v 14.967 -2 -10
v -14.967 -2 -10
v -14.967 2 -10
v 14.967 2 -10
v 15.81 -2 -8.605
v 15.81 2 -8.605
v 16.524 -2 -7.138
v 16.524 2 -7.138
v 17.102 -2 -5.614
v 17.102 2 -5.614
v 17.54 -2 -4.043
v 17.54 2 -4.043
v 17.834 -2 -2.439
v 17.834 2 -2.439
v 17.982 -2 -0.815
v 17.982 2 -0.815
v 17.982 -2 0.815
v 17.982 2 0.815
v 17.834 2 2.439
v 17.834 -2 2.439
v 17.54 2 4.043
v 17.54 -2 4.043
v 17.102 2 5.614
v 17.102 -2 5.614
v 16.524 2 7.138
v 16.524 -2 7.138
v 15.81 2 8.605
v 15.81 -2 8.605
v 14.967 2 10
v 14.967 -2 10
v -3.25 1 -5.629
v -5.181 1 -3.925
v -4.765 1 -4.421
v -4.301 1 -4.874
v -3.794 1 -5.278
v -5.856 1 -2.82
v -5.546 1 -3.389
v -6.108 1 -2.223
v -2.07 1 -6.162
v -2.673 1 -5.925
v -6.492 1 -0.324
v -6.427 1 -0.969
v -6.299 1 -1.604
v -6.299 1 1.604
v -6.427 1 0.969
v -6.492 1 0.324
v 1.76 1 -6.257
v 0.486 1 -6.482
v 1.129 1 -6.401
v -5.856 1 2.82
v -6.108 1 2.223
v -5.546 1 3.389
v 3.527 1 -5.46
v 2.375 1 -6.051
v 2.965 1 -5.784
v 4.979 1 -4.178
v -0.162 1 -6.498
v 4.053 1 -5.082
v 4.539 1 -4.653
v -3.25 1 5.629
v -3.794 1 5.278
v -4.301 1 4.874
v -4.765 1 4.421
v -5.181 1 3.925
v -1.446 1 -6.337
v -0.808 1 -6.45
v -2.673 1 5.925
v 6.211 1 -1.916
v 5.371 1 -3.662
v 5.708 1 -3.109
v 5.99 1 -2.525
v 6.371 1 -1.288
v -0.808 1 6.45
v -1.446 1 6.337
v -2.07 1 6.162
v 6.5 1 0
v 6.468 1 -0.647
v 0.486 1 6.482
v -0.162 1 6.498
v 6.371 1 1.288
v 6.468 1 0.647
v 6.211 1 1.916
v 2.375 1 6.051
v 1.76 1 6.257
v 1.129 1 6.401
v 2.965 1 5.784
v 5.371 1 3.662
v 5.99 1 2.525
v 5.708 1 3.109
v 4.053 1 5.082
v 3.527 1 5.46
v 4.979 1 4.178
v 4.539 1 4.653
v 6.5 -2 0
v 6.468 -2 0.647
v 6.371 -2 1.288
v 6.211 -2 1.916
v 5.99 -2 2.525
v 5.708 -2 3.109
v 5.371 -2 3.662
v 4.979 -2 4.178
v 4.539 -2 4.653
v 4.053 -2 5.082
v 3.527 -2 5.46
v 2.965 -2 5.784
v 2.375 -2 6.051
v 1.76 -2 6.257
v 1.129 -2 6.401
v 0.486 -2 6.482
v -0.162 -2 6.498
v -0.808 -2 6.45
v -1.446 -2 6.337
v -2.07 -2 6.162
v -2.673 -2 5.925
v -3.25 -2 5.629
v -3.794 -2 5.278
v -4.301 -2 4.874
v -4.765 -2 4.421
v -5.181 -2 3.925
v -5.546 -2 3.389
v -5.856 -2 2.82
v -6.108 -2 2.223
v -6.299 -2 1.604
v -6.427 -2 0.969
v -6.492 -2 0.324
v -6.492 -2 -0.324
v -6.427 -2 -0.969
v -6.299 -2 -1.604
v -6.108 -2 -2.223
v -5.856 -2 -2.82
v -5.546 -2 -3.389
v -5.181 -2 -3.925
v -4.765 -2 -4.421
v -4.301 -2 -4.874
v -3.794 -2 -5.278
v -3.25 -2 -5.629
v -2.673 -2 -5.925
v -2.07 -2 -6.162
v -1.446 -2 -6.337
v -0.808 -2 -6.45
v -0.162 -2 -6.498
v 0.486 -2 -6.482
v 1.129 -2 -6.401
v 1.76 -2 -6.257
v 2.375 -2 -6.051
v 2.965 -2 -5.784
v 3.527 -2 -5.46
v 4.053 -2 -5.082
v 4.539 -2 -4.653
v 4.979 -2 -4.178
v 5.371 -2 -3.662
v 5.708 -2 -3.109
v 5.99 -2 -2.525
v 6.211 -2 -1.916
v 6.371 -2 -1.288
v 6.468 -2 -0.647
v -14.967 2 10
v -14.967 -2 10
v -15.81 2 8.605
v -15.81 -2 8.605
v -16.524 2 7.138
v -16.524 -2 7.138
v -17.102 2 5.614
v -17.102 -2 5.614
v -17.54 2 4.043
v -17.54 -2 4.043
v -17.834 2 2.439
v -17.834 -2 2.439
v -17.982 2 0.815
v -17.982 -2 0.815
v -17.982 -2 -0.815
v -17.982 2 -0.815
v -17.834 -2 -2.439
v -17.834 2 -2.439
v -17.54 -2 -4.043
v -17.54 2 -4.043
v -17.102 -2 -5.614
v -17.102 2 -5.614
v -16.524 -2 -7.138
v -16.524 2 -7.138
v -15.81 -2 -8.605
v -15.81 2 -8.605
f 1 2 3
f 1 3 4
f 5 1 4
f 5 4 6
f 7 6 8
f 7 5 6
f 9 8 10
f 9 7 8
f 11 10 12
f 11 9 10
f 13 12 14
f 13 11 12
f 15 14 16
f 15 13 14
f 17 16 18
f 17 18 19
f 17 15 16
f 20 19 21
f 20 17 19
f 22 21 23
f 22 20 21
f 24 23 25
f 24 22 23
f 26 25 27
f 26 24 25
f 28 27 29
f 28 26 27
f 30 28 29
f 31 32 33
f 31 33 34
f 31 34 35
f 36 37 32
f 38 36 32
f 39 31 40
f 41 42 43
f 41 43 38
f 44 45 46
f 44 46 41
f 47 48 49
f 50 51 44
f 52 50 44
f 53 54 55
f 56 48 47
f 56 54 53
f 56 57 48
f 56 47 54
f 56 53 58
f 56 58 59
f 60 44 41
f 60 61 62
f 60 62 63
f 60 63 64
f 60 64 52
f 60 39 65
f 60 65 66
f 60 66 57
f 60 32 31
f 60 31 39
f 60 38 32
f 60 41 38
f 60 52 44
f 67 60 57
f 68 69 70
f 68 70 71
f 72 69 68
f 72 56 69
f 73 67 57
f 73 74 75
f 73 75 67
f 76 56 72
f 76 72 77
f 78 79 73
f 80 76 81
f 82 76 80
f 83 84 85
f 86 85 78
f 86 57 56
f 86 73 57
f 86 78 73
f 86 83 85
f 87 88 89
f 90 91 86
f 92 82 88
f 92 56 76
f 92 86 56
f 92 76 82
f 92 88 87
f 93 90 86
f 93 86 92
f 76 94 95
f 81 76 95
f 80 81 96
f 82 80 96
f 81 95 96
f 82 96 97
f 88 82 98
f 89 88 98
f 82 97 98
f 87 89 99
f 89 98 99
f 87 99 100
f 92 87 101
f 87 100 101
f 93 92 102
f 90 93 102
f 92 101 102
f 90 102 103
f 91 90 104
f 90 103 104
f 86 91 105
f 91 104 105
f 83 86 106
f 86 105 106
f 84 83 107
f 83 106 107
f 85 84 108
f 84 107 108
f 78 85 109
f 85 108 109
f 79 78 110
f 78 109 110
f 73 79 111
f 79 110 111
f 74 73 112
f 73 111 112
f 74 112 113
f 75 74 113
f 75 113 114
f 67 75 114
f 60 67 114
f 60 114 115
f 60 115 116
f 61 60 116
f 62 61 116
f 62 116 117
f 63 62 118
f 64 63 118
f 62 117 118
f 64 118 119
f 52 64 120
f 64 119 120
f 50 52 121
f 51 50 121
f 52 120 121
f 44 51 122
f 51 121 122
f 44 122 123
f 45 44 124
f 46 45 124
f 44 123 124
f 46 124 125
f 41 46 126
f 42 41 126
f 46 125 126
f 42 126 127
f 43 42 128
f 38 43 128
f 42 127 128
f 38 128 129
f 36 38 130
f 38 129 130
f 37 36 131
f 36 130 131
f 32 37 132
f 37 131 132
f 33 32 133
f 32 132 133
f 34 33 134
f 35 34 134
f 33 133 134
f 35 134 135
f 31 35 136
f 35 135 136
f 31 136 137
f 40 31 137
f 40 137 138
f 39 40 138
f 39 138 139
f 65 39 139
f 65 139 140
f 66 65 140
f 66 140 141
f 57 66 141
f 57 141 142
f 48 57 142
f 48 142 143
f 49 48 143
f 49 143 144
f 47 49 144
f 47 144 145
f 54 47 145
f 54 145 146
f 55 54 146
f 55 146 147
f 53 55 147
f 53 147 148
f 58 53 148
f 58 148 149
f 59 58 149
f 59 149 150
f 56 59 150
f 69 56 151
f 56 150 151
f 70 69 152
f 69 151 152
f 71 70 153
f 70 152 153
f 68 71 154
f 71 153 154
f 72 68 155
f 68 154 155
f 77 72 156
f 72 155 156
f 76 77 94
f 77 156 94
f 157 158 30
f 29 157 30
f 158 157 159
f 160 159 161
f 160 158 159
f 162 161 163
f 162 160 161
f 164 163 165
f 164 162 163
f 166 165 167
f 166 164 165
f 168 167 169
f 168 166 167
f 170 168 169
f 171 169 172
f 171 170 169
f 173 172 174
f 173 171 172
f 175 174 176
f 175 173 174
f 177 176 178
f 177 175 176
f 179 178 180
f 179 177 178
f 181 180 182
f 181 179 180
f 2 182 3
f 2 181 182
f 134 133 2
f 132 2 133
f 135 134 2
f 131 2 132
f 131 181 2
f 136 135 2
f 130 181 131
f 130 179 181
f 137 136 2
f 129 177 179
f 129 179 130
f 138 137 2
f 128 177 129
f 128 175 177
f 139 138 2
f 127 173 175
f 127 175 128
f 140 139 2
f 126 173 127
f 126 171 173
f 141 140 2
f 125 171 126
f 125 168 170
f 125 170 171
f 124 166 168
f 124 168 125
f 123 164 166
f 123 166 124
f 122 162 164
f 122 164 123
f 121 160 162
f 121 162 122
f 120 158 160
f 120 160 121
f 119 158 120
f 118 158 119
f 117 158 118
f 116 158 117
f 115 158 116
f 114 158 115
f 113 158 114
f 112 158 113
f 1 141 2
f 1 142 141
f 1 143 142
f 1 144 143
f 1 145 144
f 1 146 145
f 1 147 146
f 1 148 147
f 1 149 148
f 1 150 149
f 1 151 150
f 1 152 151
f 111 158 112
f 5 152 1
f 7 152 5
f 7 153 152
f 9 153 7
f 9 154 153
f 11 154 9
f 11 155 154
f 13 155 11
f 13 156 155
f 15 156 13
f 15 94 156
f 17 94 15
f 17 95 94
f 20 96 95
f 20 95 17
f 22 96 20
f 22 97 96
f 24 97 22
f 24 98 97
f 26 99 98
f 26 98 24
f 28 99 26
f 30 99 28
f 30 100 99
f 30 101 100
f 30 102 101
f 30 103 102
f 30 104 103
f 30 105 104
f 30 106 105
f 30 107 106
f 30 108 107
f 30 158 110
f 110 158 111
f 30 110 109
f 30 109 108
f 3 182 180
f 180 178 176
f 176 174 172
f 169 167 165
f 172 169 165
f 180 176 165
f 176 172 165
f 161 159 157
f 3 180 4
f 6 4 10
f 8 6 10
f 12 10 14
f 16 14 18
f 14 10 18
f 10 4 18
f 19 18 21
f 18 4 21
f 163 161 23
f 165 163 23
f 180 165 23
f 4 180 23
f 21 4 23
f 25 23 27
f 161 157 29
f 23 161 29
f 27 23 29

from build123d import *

# Parameters (mm, degrees)
F0_R     = 18
F1_DEPTH = 2
F2_R     = 6.5
F3_DEPTH = 3
F4_W     = 46
F4_H     = 8.283501
F5_DEPTH = 25


with BuildPart() as f1:
    # F0 (on Front) → F1 (new body, symmetric)
    with BuildSketch(Plane.XZ):
        Circle(F0_R)
    extrude(amount=F1_DEPTH, both=True)

    # F2 (on face) → F3 (cut)
    with BuildSketch(Plane.XZ.offset(2)):
        Circle(F2_R)
    extrude(amount=-F3_DEPTH, mode=Mode.SUBTRACT)

    # F4 (on face) → F5 (cut)
    with BuildSketch(Plane.XZ.offset(2)):
        with Locations((-4.178571, 14.14175)):
            Rectangle(F4_W, F4_H)
        with Locations((-4.178571, -14.14175)):
            Rectangle(F4_W, F4_H)
    extrude(amount=-F5_DEPTH, mode=Mode.SUBTRACT)


solid = f1.part
